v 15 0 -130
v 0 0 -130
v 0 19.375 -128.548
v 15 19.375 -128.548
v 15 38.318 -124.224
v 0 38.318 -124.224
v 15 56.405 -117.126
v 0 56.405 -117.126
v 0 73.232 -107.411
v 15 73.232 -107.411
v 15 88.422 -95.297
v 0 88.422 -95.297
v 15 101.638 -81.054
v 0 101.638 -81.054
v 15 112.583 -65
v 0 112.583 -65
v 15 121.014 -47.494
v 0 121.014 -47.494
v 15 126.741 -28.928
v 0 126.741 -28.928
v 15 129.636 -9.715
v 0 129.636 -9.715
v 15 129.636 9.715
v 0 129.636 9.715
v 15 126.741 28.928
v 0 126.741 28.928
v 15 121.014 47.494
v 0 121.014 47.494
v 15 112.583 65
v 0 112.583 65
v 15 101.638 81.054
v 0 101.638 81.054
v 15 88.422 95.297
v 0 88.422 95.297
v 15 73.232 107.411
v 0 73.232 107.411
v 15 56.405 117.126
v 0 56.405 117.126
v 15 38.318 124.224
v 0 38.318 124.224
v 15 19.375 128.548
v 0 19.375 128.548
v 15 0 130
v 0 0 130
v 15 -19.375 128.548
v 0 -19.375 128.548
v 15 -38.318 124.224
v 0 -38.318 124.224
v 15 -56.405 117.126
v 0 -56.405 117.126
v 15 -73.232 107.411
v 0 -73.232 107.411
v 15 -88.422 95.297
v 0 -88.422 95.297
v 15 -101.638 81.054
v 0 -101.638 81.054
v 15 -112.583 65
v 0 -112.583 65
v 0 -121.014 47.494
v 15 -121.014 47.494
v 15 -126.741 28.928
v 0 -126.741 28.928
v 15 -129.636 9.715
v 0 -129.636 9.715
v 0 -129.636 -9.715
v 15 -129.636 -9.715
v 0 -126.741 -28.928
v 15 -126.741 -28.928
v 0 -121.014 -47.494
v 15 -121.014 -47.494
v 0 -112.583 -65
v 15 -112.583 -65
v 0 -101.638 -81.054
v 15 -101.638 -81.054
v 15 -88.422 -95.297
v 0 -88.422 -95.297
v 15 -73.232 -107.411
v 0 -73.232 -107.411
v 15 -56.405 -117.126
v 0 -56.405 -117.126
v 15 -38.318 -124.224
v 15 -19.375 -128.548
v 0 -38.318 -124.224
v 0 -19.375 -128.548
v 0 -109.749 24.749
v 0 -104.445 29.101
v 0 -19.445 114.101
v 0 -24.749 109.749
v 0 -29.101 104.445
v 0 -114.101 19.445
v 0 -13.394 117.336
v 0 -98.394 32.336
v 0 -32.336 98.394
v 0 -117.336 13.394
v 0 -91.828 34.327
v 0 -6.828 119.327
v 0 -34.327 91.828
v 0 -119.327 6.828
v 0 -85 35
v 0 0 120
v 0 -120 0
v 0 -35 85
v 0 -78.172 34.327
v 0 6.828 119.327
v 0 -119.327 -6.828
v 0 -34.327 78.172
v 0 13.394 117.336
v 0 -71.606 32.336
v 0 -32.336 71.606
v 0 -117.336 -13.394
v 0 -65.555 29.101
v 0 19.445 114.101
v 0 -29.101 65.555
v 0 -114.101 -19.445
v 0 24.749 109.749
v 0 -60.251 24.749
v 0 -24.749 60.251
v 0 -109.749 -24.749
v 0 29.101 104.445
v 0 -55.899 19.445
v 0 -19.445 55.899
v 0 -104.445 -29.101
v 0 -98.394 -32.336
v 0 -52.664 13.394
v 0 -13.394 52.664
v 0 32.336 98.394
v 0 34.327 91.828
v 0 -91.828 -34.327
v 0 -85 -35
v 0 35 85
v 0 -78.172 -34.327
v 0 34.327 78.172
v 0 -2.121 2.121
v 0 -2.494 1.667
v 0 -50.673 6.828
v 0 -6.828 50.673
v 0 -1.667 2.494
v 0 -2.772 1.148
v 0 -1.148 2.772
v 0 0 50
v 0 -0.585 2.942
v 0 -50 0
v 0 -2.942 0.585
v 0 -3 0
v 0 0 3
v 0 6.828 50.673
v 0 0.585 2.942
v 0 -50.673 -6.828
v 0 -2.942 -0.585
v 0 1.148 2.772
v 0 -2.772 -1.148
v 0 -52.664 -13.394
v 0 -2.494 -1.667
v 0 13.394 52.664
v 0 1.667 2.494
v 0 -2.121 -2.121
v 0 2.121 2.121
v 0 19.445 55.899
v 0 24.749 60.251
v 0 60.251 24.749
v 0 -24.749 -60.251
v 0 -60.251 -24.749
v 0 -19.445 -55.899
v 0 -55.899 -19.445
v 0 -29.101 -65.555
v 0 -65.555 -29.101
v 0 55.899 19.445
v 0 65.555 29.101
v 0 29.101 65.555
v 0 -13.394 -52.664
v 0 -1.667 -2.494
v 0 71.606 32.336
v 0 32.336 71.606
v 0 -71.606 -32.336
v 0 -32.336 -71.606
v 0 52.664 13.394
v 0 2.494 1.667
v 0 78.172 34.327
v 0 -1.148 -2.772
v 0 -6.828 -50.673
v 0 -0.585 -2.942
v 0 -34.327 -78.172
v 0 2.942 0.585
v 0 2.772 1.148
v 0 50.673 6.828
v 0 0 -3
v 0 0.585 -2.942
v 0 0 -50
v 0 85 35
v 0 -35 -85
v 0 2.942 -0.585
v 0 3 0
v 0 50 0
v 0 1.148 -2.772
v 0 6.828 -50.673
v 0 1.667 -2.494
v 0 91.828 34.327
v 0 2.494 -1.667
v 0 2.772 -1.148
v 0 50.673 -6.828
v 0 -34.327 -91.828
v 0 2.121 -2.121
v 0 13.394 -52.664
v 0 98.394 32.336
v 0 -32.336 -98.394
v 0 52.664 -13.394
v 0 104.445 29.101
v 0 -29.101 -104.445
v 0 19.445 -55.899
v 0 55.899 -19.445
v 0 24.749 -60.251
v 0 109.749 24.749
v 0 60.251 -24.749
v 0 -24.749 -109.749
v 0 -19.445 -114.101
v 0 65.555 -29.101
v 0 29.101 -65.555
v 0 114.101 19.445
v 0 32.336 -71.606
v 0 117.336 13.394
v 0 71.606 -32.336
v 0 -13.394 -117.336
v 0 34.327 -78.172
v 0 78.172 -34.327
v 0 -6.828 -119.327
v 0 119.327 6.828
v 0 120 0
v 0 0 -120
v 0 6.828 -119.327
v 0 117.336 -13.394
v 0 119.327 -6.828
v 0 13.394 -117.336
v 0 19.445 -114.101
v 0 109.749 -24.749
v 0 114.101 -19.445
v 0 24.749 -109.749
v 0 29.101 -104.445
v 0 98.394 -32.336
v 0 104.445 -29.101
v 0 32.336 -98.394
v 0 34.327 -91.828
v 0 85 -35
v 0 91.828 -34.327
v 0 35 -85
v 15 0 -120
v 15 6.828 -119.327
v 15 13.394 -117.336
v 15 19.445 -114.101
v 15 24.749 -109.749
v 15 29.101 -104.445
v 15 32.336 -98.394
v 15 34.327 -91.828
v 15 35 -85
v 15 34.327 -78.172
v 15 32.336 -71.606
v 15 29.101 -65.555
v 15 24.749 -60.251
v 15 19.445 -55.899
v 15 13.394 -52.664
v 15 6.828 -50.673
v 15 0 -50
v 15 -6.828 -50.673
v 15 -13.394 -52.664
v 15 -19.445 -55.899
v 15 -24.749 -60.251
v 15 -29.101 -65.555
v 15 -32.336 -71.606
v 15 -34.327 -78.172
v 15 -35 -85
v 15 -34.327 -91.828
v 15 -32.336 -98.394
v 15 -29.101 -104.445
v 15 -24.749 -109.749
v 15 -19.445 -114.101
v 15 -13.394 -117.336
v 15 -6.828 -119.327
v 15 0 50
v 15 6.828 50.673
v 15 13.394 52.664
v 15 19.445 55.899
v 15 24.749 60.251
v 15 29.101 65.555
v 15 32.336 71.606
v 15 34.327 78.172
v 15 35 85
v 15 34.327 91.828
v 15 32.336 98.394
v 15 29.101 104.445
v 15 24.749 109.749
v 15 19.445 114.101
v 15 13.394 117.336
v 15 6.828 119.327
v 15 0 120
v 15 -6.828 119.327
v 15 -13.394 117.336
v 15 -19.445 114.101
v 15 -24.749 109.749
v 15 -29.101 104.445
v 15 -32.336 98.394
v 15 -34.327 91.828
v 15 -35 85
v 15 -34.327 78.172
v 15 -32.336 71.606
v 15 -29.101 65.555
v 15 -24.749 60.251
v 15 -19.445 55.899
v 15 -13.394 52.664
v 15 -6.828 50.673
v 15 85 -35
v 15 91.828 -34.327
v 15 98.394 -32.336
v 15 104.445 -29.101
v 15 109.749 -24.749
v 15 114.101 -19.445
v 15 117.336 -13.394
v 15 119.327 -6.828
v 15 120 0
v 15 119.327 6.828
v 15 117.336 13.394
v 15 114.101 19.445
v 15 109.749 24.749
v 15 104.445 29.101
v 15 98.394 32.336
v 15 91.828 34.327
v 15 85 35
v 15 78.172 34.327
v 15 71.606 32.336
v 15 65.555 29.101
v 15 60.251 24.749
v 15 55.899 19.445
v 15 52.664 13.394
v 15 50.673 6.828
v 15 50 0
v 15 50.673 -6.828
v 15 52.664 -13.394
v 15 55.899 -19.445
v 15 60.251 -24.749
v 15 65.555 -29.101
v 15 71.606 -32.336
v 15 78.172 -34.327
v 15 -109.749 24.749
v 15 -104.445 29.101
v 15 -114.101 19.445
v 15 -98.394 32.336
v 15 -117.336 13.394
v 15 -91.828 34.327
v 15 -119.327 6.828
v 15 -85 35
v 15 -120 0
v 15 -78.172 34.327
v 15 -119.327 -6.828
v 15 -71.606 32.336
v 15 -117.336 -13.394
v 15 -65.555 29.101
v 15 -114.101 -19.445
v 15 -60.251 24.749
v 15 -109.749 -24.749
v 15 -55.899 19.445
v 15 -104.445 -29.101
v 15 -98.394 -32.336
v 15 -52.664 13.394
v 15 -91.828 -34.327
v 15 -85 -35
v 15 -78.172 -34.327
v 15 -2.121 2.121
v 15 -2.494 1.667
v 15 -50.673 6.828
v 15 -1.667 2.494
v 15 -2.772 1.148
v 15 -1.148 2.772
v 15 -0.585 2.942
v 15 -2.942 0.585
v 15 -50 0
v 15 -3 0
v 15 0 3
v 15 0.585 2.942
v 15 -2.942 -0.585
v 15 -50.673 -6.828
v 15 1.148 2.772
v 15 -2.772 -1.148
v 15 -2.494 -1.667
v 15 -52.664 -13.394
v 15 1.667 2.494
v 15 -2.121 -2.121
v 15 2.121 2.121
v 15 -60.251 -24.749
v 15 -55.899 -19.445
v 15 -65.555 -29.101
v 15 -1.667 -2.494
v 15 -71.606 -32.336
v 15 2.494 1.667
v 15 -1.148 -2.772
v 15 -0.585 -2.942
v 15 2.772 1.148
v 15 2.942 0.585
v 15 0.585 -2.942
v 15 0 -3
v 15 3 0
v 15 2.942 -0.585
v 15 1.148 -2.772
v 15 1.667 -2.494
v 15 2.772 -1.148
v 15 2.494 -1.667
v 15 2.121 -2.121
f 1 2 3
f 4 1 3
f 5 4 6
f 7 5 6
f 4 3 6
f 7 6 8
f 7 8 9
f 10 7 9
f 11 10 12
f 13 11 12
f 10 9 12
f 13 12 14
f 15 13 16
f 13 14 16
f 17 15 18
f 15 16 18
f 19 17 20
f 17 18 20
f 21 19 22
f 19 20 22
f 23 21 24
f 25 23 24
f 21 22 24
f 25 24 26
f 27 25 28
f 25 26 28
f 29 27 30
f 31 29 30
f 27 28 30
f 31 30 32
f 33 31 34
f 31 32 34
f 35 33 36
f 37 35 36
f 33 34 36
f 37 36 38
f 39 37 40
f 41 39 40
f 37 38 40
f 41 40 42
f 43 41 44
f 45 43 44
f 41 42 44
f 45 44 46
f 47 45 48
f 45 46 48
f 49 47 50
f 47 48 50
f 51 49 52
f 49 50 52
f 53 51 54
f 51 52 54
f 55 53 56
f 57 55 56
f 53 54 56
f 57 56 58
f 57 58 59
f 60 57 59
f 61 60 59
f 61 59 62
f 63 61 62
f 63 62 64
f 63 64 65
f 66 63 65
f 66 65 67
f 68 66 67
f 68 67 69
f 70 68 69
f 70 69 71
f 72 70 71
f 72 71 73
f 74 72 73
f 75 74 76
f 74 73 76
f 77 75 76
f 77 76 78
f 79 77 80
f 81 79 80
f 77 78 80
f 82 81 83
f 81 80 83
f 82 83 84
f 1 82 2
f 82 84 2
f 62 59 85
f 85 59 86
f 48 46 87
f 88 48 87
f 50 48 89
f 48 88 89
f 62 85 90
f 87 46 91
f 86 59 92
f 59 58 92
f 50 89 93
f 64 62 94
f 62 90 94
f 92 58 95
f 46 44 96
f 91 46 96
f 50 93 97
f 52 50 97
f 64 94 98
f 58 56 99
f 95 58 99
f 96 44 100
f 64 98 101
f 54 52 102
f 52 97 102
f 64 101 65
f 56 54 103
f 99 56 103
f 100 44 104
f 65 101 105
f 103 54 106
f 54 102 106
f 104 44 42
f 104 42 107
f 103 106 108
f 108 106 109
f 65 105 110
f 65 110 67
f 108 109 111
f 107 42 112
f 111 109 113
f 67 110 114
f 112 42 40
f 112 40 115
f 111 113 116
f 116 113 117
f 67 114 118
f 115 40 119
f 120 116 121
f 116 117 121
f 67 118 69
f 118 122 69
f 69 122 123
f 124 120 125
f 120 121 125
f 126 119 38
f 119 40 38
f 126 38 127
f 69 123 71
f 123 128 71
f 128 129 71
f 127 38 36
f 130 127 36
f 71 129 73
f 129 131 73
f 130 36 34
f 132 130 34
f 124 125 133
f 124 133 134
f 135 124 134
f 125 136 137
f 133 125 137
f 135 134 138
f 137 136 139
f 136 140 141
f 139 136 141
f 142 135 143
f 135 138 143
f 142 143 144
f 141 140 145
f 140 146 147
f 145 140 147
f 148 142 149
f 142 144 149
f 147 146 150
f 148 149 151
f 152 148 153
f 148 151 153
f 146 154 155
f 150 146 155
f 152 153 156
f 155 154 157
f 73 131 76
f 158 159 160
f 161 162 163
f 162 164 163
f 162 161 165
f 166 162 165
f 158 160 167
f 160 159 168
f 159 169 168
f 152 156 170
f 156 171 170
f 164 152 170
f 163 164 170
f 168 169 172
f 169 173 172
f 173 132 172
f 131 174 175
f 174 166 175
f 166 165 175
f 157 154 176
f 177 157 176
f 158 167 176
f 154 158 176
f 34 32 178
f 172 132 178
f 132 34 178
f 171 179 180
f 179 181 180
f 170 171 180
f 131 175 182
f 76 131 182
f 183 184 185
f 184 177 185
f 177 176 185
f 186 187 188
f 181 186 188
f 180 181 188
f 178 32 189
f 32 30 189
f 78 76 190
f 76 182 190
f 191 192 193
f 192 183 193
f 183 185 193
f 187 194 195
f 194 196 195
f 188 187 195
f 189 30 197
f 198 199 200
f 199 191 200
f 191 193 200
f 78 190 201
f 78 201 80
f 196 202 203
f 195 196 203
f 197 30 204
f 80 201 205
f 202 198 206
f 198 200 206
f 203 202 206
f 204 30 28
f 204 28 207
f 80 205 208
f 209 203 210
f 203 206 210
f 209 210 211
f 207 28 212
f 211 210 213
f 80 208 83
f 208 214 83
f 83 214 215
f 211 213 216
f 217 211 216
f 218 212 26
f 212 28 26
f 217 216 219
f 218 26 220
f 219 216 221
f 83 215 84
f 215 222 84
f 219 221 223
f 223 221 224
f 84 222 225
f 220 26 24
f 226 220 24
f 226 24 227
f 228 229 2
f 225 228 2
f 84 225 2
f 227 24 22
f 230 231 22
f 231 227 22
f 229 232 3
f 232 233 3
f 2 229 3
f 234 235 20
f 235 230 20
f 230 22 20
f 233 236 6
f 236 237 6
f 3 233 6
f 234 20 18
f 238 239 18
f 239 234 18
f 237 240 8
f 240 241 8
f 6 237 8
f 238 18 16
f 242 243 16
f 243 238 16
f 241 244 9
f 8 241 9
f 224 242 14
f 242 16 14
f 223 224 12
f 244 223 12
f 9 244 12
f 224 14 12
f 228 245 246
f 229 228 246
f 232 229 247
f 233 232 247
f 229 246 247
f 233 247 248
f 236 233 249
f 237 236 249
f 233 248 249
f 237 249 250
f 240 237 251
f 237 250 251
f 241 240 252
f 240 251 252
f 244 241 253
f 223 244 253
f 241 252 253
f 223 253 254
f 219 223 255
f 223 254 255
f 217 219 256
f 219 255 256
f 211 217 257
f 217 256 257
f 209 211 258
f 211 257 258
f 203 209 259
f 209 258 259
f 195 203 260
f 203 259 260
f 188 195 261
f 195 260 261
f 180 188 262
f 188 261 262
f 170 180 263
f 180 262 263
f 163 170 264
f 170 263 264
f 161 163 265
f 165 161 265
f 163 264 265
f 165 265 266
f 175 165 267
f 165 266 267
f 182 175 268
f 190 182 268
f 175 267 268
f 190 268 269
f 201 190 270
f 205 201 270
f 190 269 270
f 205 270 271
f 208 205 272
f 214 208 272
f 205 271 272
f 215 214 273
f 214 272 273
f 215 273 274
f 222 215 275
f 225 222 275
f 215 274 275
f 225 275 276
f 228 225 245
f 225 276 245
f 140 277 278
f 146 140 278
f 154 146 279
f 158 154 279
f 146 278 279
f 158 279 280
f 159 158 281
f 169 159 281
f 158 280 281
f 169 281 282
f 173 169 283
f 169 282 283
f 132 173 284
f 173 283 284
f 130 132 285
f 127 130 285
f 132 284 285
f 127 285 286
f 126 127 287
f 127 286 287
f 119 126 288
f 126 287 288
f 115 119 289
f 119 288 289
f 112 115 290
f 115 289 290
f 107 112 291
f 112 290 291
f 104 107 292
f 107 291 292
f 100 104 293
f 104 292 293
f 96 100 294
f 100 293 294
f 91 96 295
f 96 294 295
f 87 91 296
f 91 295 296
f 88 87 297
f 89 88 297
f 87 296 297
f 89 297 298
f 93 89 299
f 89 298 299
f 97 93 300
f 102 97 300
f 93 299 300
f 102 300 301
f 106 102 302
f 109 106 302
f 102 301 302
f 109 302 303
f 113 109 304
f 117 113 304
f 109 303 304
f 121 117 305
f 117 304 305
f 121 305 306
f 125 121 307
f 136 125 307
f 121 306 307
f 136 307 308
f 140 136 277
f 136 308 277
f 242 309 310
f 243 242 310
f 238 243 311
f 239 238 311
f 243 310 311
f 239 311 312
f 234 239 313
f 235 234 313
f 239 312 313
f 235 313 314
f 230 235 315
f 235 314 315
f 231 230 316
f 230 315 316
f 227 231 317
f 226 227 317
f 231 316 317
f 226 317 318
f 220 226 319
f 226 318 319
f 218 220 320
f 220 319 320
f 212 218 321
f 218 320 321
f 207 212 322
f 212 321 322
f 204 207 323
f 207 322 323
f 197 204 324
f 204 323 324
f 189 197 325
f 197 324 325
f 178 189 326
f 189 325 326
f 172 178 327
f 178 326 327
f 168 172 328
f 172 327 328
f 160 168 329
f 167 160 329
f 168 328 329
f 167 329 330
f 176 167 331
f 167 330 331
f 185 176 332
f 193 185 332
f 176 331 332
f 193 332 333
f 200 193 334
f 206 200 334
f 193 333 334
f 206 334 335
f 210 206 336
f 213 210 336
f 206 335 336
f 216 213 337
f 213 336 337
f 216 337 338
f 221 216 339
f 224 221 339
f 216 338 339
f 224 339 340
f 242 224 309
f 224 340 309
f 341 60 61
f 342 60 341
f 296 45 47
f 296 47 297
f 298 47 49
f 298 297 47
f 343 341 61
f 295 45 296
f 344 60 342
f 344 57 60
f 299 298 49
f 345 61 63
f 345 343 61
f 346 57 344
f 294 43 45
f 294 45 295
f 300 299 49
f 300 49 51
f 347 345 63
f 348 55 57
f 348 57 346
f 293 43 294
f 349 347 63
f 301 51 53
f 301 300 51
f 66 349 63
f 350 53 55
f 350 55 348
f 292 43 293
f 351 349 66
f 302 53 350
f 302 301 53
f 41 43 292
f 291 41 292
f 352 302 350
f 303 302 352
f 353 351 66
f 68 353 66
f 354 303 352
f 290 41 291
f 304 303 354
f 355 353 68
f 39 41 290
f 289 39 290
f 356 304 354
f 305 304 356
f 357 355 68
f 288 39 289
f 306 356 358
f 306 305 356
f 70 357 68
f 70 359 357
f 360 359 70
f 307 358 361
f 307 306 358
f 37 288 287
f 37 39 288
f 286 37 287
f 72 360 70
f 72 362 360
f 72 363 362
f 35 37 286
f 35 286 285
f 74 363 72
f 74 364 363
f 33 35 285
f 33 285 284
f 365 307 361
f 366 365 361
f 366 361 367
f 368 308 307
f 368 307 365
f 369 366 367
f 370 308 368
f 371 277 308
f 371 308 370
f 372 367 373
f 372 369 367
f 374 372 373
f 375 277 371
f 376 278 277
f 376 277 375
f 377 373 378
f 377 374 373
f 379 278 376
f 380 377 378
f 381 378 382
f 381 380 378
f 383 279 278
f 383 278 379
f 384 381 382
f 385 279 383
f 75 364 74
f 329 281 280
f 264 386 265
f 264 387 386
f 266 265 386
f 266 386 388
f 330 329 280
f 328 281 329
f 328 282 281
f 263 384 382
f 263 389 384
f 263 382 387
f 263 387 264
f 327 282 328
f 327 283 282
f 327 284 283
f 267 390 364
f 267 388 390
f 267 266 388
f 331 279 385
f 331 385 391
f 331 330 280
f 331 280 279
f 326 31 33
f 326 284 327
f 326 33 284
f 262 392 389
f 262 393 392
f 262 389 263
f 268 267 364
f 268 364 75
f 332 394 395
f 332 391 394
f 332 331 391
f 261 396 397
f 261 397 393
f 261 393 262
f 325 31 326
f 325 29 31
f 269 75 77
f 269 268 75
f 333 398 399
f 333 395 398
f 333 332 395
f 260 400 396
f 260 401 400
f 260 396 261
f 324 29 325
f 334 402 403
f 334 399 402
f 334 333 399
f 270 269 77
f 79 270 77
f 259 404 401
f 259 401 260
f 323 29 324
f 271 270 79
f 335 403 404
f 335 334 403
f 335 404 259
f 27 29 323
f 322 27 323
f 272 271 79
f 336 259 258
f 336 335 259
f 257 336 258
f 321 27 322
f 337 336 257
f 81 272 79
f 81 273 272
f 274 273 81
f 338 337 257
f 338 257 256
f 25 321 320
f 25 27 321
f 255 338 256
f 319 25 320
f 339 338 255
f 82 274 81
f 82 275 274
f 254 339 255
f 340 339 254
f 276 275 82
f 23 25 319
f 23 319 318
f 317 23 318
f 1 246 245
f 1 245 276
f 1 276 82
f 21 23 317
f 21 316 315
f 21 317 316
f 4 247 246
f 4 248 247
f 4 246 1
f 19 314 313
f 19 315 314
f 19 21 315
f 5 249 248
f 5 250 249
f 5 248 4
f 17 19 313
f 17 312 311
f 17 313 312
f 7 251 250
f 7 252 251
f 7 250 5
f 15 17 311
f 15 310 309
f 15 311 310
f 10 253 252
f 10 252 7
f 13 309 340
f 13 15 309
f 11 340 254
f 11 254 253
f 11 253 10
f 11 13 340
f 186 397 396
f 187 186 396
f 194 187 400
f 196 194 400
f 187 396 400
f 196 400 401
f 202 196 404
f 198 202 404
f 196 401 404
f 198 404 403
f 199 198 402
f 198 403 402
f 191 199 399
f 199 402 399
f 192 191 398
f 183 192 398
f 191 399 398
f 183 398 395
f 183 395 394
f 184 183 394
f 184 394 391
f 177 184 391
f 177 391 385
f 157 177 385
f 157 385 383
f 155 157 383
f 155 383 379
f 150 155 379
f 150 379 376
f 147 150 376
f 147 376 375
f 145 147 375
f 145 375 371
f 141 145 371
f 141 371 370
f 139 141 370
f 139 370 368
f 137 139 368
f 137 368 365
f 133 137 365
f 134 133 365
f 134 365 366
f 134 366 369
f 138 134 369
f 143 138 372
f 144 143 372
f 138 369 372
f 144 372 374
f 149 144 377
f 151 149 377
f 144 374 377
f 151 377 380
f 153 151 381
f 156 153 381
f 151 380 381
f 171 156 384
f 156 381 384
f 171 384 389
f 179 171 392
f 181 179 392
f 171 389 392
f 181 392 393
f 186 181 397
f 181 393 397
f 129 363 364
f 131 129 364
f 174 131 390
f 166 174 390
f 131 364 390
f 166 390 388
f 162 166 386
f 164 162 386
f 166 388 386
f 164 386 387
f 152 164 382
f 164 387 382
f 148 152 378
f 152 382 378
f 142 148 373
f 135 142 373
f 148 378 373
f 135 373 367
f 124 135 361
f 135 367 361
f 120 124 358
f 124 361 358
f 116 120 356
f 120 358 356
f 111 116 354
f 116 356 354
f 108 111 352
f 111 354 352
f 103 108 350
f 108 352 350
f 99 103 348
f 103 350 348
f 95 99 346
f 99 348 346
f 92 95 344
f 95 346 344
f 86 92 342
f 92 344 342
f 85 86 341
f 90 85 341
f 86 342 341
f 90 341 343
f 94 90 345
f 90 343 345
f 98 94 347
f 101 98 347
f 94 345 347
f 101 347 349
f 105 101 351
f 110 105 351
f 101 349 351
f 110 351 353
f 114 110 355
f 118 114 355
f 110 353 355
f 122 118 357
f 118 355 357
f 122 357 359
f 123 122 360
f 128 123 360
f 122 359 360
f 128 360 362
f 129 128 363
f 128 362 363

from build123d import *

# Parameters (mm, degrees)
ESQUISSE2_R             = 130
BOSS_EXTRU_1_DEPTH      = 15
ESQUISSE3_R             = 35
ENL_V_MAT_EXTRU_1_DEPTH = 15
ESQUISSE4_R             = 3
ENL_V_MAT_EXTRU_3_DEPTH = 24


with BuildPart() as part:
    # Esquisse2 → Boss.-Extru.1 (new body)
    with BuildSketch(Plane(origin=(0, 0, 0), x_dir=(0, 0, -1), z_dir=(1, 0, 0))):
        Circle(ESQUISSE2_R)
    extrude(amount=BOSS_EXTRU_1_DEPTH)

    # Esquisse3 → Enlèv. mat.-Extru.1 (cut)
    with BuildSketch(Plane(origin=(15, 0, 0), x_dir=(0, 0, -1), z_dir=(1, 0, 0))):
        with Locations((0, 85)):
            Circle(ESQUISSE3_R)
        with Locations((85, 0)):
            Circle(ESQUISSE3_R)
        with Locations((0, -85)):
            Circle(ESQUISSE3_R)
        with Locations((-85, 0)):
            Circle(ESQUISSE3_R)
    extrude(amount=-ENL_V_MAT_EXTRU_1_DEPTH, mode=Mode.SUBTRACT)

    # Esquisse4 → Enlèv. mat.-Extru.3 (cut)
    with BuildSketch(Plane(origin=(15, 0, 0), x_dir=(0, 0, -1), z_dir=(1, 0, 0))):
        Circle(ESQUISSE4_R)
    extrude(amount=-ENL_V_MAT_EXTRU_3_DEPTH, mode=Mode.SUBTRACT)


solid = part.part
